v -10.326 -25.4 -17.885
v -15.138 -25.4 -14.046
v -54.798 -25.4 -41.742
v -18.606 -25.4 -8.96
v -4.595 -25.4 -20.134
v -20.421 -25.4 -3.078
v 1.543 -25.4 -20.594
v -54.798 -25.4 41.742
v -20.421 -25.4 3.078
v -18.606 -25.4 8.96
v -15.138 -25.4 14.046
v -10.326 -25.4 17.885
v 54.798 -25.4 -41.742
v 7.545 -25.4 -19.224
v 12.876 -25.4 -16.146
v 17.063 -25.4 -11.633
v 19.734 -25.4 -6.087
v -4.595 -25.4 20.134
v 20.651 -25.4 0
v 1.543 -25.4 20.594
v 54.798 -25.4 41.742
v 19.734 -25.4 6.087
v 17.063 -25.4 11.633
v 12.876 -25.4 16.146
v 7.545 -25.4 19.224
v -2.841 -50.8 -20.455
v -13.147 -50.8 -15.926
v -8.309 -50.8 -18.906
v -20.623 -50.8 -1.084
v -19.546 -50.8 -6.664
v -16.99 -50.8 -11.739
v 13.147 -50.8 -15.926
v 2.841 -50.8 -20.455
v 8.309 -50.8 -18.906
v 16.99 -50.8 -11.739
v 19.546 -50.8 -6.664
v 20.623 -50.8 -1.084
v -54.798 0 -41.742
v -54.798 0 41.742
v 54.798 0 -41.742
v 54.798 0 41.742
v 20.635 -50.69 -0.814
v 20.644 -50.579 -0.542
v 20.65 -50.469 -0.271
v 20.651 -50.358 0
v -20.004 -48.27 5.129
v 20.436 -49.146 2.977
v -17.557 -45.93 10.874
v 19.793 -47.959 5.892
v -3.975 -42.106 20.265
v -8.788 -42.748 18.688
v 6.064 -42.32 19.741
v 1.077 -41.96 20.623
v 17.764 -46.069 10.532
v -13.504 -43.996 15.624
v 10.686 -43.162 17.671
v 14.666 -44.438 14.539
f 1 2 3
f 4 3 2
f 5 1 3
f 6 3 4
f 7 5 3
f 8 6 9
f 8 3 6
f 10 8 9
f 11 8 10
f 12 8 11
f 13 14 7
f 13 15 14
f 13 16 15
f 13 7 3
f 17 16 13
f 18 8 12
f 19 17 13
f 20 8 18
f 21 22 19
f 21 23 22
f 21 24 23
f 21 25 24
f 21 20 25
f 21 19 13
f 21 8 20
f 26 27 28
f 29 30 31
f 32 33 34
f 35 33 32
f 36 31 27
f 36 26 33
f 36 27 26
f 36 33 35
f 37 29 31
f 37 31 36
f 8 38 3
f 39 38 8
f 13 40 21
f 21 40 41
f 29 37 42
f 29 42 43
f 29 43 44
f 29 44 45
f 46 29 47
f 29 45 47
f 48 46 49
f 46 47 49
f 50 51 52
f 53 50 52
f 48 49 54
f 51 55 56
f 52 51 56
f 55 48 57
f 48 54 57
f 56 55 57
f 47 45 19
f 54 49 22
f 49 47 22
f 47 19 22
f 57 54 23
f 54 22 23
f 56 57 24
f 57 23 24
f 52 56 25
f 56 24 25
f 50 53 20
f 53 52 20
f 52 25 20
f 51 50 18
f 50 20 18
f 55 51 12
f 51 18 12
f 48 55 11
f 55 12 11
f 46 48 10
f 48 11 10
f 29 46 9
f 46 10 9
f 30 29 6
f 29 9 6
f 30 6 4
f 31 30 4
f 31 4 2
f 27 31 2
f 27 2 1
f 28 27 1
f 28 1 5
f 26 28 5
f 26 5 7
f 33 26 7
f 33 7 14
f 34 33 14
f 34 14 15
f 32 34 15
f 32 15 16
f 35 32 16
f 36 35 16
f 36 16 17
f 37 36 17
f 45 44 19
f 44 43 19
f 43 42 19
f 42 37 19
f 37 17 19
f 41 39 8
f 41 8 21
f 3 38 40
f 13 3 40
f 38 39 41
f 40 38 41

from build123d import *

# Parameters (mm, degrees)
F0_W     = 109.595508
F0_H     = 83.483816
F1_DEPTH = 25.4
F2_R     = 20.651308
F3_DEPTH = 25.4
F5_DEPTH = 25.4


with BuildPart() as f1:
    # F0 (on Front) → F1 (new body)
    with BuildSketch(Plane.XZ):
        Rectangle(F0_W, F0_H)
    extrude(amount=F1_DEPTH)

    # F2 (on face) → F3 (join)
    with BuildSketch(Plane.XZ.offset(25.4)):
        Circle(F2_R)
    extrude(amount=F3_DEPTH)

    # F4 (on Right) → F5 (cut, symmetric)
    with BuildSketch(Plane.YZ):
        Polygon((-65.909445, 37.025604), (-65.909445, -38.188711), (-35.280939, 37.025604), align=None)
    extrude(amount=F5_DEPTH, both=True, mode=Mode.SUBTRACT)


solid = f1.part
